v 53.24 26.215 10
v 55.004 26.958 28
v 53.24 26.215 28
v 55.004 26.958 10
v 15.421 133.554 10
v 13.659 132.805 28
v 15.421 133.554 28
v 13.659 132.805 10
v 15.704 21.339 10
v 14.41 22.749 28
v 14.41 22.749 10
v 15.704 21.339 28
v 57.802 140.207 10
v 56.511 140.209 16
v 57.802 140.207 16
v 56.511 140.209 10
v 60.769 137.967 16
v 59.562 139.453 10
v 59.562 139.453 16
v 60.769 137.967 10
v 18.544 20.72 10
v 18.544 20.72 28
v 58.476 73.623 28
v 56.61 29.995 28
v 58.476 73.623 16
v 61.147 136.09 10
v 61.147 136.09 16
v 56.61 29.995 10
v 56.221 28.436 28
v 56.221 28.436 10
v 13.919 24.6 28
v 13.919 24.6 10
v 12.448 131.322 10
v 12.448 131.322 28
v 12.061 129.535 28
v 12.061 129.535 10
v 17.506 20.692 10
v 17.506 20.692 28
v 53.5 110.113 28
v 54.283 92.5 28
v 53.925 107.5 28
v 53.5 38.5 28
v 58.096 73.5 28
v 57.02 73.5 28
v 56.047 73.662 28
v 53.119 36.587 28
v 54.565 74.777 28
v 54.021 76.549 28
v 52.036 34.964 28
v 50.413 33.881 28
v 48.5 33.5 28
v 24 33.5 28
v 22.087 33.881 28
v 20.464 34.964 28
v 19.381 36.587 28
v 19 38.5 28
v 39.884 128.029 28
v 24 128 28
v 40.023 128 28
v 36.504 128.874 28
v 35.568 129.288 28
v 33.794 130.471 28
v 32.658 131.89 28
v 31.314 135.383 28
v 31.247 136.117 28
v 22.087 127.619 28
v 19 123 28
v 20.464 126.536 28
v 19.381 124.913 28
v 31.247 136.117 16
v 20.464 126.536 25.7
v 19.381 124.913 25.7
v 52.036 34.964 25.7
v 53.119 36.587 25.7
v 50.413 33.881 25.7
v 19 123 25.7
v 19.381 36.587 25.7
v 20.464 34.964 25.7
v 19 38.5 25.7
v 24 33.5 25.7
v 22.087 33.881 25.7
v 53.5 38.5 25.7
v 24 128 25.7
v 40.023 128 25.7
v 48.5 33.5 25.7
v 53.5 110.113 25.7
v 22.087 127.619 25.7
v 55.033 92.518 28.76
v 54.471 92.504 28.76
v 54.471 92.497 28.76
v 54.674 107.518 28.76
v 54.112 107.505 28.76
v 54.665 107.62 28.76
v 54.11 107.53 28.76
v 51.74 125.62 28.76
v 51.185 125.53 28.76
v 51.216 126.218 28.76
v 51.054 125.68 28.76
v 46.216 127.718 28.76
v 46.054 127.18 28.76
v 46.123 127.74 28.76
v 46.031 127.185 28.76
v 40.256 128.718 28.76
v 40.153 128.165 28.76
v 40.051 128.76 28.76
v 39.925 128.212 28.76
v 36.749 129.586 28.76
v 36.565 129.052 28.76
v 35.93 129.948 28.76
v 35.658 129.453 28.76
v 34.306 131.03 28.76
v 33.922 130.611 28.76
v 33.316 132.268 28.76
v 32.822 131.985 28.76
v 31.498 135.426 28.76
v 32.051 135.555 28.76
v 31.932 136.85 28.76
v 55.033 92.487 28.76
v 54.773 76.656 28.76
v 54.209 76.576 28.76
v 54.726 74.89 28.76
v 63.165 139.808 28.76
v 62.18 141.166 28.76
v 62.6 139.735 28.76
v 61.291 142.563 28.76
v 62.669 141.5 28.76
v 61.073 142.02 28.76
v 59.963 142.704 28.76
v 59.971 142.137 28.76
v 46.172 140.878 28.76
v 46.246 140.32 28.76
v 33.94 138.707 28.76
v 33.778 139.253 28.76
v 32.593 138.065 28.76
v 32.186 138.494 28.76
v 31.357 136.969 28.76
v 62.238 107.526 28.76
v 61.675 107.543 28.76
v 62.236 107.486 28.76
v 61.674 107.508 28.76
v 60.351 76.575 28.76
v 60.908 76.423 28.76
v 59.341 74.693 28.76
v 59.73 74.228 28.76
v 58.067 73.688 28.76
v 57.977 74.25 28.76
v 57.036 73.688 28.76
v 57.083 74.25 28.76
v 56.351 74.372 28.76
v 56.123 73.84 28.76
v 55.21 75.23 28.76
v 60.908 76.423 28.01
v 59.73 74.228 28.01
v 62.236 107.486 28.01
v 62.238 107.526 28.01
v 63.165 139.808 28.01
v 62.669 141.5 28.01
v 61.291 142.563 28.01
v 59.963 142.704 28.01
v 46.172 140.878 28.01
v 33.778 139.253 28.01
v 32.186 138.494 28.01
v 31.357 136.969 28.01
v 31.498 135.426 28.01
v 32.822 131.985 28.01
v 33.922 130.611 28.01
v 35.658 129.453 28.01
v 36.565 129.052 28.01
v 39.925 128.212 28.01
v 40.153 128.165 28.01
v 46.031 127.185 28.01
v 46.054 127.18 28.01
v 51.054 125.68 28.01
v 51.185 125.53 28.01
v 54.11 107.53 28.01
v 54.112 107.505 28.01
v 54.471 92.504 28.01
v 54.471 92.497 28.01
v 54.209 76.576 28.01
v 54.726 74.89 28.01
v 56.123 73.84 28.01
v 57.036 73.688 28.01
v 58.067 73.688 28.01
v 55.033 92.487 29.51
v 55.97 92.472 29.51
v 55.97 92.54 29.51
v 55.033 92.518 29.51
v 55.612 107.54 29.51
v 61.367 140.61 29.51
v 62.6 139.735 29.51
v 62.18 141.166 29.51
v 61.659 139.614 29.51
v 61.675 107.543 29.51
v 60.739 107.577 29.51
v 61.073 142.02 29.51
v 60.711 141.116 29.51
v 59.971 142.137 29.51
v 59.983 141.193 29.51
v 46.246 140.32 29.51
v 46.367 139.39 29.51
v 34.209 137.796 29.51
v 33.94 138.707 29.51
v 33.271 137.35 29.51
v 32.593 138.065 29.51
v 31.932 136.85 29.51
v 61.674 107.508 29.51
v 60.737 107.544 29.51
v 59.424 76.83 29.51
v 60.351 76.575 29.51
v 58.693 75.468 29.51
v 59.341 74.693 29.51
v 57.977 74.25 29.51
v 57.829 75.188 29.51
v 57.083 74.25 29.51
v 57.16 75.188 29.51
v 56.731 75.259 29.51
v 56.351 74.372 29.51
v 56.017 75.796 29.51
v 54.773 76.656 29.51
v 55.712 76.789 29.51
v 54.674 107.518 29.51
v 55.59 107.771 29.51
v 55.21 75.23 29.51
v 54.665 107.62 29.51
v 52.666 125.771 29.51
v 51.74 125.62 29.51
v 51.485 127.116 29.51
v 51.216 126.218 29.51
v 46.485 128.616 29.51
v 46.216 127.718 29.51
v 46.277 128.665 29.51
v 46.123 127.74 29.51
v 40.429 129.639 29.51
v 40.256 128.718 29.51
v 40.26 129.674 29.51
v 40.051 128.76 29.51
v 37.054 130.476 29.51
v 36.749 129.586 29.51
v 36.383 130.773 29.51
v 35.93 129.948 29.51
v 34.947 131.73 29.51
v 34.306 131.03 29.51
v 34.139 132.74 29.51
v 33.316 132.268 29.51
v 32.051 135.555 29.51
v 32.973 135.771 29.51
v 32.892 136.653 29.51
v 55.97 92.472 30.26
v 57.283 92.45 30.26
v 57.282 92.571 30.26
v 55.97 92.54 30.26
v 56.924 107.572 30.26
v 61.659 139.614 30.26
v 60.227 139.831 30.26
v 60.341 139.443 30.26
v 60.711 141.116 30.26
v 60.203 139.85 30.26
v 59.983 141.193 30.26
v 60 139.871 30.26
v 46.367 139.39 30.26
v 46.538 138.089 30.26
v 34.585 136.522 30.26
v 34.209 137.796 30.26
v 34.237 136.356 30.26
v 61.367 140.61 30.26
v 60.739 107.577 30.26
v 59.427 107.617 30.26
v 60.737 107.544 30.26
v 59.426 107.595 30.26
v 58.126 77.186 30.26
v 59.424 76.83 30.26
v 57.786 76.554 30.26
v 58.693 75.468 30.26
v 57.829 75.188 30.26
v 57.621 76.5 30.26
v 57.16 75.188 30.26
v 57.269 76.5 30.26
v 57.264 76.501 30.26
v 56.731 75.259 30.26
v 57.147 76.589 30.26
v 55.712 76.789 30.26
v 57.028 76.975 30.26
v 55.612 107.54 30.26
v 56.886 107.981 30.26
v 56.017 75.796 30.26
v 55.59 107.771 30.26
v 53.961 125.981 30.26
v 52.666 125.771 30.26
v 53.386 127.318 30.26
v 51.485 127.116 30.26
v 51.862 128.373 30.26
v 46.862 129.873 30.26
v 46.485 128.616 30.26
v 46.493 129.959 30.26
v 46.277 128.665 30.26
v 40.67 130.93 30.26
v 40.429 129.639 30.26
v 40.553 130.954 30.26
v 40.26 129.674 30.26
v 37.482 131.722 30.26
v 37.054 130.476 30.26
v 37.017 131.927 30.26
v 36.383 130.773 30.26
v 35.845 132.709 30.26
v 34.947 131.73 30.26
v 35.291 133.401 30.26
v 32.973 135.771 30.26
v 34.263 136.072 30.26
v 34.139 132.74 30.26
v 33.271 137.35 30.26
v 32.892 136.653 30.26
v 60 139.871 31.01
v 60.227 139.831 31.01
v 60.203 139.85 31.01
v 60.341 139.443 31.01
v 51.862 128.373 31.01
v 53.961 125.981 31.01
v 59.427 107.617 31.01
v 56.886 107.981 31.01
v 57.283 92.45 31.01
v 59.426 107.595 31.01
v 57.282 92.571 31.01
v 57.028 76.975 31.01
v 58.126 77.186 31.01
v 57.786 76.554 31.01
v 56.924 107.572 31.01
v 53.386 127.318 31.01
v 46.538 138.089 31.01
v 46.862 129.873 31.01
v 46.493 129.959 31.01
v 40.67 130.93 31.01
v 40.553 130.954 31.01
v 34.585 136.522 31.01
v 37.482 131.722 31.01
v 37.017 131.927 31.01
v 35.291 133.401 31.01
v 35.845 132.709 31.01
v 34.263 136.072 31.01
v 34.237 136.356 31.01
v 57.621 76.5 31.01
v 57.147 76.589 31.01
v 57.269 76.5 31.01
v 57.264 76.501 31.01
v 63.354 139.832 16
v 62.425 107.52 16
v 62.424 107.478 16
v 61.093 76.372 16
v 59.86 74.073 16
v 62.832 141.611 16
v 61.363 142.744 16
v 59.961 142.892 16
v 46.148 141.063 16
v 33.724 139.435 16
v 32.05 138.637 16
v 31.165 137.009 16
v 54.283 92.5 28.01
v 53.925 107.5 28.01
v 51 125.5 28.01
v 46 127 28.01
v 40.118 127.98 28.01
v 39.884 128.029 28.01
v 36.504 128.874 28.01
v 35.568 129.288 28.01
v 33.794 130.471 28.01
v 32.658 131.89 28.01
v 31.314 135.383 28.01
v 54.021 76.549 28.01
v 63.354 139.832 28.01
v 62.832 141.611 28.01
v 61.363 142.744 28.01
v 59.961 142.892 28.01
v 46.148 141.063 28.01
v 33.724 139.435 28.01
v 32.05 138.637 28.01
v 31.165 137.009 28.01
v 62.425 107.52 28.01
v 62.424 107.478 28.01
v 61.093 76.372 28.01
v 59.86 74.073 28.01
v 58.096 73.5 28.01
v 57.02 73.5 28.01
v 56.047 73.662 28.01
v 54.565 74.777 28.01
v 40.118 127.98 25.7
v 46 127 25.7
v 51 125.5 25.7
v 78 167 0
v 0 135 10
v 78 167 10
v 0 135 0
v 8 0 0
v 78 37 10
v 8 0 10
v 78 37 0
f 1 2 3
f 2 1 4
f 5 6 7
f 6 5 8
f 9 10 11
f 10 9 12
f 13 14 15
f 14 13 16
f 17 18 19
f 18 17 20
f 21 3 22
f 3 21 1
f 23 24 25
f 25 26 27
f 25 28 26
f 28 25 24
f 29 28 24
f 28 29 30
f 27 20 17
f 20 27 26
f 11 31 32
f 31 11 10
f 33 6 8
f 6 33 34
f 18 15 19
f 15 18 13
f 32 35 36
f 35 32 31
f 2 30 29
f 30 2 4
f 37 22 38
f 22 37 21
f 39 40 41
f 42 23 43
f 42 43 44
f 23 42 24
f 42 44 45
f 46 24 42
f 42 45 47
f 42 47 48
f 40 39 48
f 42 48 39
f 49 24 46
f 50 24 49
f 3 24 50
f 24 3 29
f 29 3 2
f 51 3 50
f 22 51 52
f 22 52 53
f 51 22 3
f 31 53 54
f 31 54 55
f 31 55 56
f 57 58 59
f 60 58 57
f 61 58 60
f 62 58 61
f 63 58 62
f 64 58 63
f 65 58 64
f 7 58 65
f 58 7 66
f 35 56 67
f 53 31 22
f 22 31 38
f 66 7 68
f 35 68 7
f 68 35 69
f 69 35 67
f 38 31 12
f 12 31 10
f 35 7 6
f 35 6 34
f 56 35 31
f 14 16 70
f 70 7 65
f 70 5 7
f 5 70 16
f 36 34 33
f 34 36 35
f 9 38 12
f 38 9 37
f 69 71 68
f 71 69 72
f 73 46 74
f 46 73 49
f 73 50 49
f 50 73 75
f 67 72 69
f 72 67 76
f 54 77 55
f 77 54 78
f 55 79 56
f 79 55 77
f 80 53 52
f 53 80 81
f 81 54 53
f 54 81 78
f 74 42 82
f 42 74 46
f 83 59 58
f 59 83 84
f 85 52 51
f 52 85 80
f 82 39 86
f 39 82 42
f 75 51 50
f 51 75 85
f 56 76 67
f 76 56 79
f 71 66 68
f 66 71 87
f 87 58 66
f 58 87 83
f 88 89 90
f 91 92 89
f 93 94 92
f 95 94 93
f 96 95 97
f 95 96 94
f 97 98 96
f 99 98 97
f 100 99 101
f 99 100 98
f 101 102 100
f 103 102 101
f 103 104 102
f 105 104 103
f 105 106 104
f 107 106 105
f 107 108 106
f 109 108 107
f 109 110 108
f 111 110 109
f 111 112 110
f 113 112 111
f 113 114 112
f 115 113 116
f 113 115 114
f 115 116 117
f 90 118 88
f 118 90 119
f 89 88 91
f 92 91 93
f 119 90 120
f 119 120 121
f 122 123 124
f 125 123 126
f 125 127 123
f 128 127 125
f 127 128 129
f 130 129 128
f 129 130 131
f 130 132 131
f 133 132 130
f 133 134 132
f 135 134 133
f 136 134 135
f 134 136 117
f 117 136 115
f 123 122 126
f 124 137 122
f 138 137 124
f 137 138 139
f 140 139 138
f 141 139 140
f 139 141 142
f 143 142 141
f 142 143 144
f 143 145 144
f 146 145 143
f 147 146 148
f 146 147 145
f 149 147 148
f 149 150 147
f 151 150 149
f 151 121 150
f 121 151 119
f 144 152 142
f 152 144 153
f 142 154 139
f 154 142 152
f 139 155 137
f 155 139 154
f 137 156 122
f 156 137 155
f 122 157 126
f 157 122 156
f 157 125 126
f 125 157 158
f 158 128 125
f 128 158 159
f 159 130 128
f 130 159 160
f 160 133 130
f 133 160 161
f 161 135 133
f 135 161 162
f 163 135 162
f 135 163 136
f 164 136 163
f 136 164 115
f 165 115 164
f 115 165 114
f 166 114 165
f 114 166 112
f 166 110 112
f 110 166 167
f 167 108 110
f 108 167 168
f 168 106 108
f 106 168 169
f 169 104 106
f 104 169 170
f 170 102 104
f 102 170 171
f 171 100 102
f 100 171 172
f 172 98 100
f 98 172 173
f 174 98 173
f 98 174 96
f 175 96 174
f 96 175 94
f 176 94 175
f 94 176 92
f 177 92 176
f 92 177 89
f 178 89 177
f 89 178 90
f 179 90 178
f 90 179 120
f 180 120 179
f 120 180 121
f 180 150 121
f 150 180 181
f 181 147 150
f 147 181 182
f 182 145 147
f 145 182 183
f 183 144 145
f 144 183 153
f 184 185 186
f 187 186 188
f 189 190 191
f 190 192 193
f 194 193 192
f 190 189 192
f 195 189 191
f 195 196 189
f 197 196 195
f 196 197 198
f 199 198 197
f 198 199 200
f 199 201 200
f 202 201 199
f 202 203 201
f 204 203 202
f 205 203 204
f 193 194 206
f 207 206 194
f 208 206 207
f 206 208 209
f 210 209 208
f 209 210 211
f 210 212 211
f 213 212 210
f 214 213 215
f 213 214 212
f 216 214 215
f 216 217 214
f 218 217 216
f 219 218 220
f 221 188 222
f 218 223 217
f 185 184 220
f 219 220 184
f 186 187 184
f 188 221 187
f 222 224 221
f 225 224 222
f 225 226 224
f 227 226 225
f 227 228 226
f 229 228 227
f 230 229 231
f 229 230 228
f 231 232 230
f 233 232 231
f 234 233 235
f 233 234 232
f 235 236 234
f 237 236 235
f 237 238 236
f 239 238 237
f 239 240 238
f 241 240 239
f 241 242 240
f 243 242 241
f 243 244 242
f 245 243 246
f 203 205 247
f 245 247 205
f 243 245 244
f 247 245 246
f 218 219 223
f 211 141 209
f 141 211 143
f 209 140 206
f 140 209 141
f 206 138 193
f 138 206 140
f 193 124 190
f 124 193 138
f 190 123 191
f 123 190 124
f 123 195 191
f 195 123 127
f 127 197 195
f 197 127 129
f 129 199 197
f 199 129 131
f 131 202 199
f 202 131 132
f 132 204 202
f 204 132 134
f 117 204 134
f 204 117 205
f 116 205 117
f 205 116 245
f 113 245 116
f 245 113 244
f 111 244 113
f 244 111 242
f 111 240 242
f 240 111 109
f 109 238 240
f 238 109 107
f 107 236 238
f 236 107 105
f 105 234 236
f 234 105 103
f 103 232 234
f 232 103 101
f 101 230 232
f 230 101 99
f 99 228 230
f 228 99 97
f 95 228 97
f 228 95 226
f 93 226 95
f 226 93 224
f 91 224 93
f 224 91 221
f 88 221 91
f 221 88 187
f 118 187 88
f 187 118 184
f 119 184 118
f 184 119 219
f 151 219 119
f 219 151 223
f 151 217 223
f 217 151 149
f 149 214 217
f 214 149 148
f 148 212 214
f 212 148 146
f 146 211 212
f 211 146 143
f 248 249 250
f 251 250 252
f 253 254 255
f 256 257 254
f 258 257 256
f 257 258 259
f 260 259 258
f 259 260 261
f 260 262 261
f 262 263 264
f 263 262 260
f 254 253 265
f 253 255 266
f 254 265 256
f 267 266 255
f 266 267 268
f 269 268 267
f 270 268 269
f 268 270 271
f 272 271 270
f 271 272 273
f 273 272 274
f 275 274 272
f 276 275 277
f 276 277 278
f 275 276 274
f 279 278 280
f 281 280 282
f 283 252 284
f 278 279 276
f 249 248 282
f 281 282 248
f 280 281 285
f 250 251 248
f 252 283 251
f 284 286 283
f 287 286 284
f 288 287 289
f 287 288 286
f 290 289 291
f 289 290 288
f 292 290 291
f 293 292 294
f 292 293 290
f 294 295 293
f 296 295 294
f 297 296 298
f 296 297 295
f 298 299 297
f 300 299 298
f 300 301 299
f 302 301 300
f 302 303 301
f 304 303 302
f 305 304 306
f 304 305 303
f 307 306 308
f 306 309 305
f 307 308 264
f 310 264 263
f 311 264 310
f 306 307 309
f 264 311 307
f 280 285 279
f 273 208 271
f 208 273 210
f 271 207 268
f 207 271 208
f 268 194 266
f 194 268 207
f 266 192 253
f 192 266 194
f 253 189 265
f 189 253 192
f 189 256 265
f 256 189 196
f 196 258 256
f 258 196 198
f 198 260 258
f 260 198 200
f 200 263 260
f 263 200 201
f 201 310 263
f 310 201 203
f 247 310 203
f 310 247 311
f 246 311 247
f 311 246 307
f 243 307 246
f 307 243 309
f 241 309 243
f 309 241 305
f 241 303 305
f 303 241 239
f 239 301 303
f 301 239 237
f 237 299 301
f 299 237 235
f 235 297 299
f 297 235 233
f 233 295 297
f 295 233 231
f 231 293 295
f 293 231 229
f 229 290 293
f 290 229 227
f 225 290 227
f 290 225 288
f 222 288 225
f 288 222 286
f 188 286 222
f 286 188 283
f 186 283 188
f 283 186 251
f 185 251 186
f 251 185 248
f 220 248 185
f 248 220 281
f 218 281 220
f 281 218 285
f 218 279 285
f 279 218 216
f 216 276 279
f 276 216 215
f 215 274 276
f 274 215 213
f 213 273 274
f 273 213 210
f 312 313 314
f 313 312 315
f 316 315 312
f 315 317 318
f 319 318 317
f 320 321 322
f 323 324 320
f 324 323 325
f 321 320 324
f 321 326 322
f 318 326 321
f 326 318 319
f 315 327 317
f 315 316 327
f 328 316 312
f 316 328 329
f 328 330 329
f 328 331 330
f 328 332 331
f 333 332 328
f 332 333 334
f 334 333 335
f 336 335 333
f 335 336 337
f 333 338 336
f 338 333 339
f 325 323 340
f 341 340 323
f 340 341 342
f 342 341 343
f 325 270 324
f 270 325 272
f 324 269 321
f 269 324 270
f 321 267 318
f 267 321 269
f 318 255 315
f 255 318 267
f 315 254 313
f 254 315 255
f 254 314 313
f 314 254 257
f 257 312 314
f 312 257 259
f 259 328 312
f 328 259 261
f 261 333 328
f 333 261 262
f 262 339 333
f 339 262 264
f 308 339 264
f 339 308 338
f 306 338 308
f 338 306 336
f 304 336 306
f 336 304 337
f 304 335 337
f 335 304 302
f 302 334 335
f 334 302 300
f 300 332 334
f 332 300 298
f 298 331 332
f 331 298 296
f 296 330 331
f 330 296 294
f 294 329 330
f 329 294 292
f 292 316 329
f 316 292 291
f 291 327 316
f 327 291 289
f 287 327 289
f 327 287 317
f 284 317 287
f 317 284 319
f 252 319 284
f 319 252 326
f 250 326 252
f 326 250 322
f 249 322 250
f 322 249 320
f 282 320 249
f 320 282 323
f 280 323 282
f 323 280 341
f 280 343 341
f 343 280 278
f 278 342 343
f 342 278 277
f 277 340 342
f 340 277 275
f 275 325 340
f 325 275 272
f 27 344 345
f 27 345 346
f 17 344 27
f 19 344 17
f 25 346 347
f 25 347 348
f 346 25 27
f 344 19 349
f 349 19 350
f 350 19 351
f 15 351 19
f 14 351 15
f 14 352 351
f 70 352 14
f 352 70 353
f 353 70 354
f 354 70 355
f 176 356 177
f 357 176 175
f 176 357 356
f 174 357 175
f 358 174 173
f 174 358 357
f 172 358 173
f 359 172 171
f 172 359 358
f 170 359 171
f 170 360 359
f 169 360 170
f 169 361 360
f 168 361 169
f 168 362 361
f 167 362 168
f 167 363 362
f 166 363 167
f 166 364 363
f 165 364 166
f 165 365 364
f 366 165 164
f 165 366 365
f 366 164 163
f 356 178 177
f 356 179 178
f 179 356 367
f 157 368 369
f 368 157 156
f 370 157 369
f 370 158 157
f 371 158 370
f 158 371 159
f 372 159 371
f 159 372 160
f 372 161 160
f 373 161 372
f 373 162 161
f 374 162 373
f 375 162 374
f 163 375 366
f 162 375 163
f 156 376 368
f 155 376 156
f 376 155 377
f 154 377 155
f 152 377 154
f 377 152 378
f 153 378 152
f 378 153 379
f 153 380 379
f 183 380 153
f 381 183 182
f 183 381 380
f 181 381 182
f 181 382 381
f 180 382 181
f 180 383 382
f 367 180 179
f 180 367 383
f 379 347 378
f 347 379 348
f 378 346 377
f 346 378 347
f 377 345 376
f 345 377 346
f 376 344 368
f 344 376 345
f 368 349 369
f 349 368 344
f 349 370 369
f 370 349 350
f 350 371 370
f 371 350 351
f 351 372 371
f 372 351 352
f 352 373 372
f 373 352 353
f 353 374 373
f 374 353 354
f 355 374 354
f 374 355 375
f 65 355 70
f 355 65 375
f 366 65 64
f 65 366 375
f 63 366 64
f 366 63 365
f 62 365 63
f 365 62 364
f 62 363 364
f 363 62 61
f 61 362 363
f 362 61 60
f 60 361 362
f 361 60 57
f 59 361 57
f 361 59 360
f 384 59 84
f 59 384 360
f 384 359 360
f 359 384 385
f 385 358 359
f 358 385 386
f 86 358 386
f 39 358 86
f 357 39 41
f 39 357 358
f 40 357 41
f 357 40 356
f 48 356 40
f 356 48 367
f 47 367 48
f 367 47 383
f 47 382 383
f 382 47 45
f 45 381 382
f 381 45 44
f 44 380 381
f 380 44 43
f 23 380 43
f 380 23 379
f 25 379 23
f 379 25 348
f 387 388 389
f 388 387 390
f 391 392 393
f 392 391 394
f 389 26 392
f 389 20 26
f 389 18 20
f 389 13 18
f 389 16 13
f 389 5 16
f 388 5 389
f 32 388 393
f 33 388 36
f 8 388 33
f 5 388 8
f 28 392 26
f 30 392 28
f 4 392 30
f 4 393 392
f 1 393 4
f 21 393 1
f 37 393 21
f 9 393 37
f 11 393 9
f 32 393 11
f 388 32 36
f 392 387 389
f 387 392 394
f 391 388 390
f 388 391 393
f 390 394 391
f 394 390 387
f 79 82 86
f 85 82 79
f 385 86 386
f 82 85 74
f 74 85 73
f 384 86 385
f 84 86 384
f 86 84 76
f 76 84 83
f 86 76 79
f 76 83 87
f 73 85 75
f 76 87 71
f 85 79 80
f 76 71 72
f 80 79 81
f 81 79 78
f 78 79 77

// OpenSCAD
// Wyze keypad sculptural wall mount — PHASE 1 COMPOSITION BLOCKOUT
// Not a printable part. Three colour masses plus a keypad reference solid.
//
// Units: mm. Authoring frame = front elevation, as seen in the hand sketch:
//   X right, Y up, Z out of the wall toward the viewer (wall plane Z = 0).
// Origin: lower-left corner of the yellow field.
// `export_frame = true` rotates the whole model so Z is up and the viewer
// looks toward +Y (used by render_blockout.py); the authoring numbers do not change.
//
// Corner coordinates were traced from reference/Keypad-sketch.jpeg at about
// 10.1 px/mm and then nudged to the sketch's written dimensions. See DESIGN.md.

blockout_revision = 3;

part = "all";          // all | yellow | black | blue | keypad
export_frame = false;

// ---------- Yellow rib-field envelope (one planar quad for now) ----------
yellow_width      = 78;    // horizontal distance between the two vertical edges
yellow_left_h     = 135;   // left vertical edge
yellow_right_h    = 130;   // right vertical edge
yellow_top_rise   = 32;    // top diagonal rises this much left -> right
yellow_bottom_inset = 8;   // bottom-left corner moves right; narrows the bottom
                           // and opens the bottom-right angle (v2)
yellow_depth      = 10;    // Z thickness of the envelope
// Bottom rise follows: top_rise + left_h - right_h. Diagonals ≈ 84 / 86 mm.

// ---------- Black central mass ----------
black_bl          = [14, 20];   // lower-left corner
black_bottom_len  = 43;         // lower edge
black_bottom_ang  = 9;          // deg, lower edge rises to the right
black_left_h      = 113;        // left edge height
black_left_lean   = -2;         // X shift of top-left vs bottom-left
black_top_len     = 50;         // upper edge
black_top_ang     = 9.2;        // deg, upper edge rises to the right
black_corner_r    = 4;          // softening of the outline corners
black_depth       = 28;         // Z thickness; must exceed keypad_depth

// ---------- Keypad reference (authoritative measured body) ----------
keypad_w      = 34.5;
keypad_h      = 94.5;
keypad_r      = 5;
keypad_depth  = 25.7;
keypad_ll     = [19, 33.5];     // lower-left corner, from the sketch outline
show_keypad_window = true;      // cut the keypad outline through the black front

// ---------- Blue wrap ----------
// Outline points (elevation XY). Inner edge traced from the sketch hatching;
// outer points sit `blue_overhang` beyond the black's top and right edges.
blue_overhang  = 2.5;   // how far the wrap hangs past the black edges
blue_proud     = 3;     // how far the wrap stands in front of the black face
blue_side_drop = 12;    // how far the wrap droops down the black's side faces
blue_soft      = 3;     // outline rounding radius
blue_layers    = 4;     // stacked offsets that round the front edge

// v3: raised to clear button 2 (top Y 123.7) and the status LED (≈38, 124)
// with ≥1.5 mm margin; v2 points were [33,129] [35.5,125.5] [39,123] [46,122] [51,120.5].
blue_inner_top = [      // from the top edge, curving across to the right side
    [30.5, 137.5], [33, 131], [36, 129], [40, 128],
    [46, 127], [51, 125.5]
];
// Droop down the black's right side: [inset from black right edge, Y as sketched].
// Y is stretched downward about blue_pivot_y by blue_stretch (1 = sketch).
blue_side    = [[6, 114], [5, 106.5], [4.5, 97]];  // tip ≥ 2·blue_soft wide or rounding erases it
blue_pivot_y = 120.5;
blue_stretch = 2;       // v2: tip from Y 97 down to ≈73.5

// ---------- Derived geometry ----------
yellow_bottom_rise = yellow_top_rise + yellow_left_h - yellow_right_h;
yellow_pts = [
    [yellow_bottom_inset, 0],
    [yellow_width, yellow_bottom_rise],
    [yellow_width, yellow_bottom_rise + yellow_right_h],
    [0, yellow_left_h]
];

black_br = black_bl + black_bottom_len * [cos(black_bottom_ang), sin(black_bottom_ang)];
black_tl = black_bl + [black_left_lean, black_left_h];
black_tr = black_tl + black_top_len * [cos(black_top_ang), sin(black_top_ang)];
black_pts = [black_bl, black_br, black_tr, black_tl];

function lerp(a, b, t) = a + (b - a) * t;
// Outward normal offset for the right edge (BR -> TR) and the top edge (TL -> TR).
function unit(v) = v / norm(v);
right_dir = unit(black_tr - black_br);
right_out = [right_dir[1], -right_dir[0]];
top_dir   = unit(black_tr - black_tl);
top_out   = [-top_dir[1], top_dir[0]];
tr_out    = black_tr + (right_out + top_out) * blue_overhang;

function black_right_x(y) =
    black_br[0] + (y - black_br[1]) * (black_tr[0] - black_br[0]) / (black_tr[1] - black_br[1]);
blue_side_pts = [for (p = blue_side)
    let(y = blue_pivot_y - (blue_pivot_y - p[1]) * blue_stretch)
        [black_right_x(y) - p[0], y]];
blue_inner = concat(blue_inner_top, blue_side_pts);
blue_start = blue_inner[0];
// Outer edge hangs blue_overhang past the black's right edge at each droop level.
blue_side_out = [for (i = [len(blue_side_pts) - 1 : -1 : 0])
    [black_right_x(blue_side_pts[i][1]) + blue_overhang, blue_side_pts[i][1]]];
blue_pts = concat(
    blue_inner,
    blue_side_out,
    [tr_out,
     lerp(black_tl, black_tr, 0.7) + top_out * blue_overhang,
     blue_start + top_out * blue_overhang * 0.6]
);

// ---------- Solids ----------
module rounded_poly(pts, r) {
    offset(r = r) offset(delta = -r) polygon(pts);
}

module yellow_field() {
    linear_extrude(yellow_depth) polygon(yellow_pts);
}

module keypad_outline() {
    translate(keypad_ll)
        offset(r = keypad_r) offset(delta = -keypad_r)
            square([keypad_w, keypad_h]);
}

module keypad_ref() {
    linear_extrude(keypad_depth) keypad_outline();
}

module black_mass() {
    difference() {
        // Starts slightly inside the yellow so the masses overlap rather than touch.
        translate([0, 0, 0.01]) linear_extrude(black_depth - 0.01)
            rounded_poly(black_pts, black_corner_r);
        if (show_keypad_window)
            translate([0, 0, -1]) linear_extrude(black_depth + 2) keypad_outline();
    }
}

module blue_outline() {
    offset(r = blue_soft) offset(delta = -blue_soft) polygon(blue_pts);
}

module blue_wrap() {
    z0 = black_depth - blue_side_drop;
    step = blue_proud / blue_layers;
    // Body down the sides, then a softened front cap built from shrinking layers.
    translate([0, 0, z0]) linear_extrude(blue_side_drop + 0.01) blue_outline();
    for (i = [0 : blue_layers - 1])
        translate([0, 0, black_depth + i * step])
            linear_extrude(step + 0.01)
                offset(r = -blue_soft * pow((i + 1) / blue_layers, 2)) blue_outline();
}

module tint(c) { if (part == "all") color(c) children(); else children(); }

module model() {
    // Single-part exports stay uncoloured so the OFF files carry plain faces.
    if (part == "all" || part == "yellow") tint("#f2c230") yellow_field();
    if (part == "all" || part == "black")  tint("#1d1d1f") black_mass();
    if (part == "all" || part == "blue")   tint("#9fd3f2") blue_wrap();
    if (part == "all" || part == "keypad") tint("#a7a9ac") keypad_ref();
}

if (export_frame) rotate([90, 0, 0]) model();
else model();

echo(str("blockout v", blockout_revision,
         " yellow diag top=", norm(yellow_pts[3] - yellow_pts[2]),
         " bottom=", norm(yellow_pts[1] - yellow_pts[0]),
         " black right=", norm(black_tr - black_br),
         " black bottom=", norm(black_br - black_bl)));
